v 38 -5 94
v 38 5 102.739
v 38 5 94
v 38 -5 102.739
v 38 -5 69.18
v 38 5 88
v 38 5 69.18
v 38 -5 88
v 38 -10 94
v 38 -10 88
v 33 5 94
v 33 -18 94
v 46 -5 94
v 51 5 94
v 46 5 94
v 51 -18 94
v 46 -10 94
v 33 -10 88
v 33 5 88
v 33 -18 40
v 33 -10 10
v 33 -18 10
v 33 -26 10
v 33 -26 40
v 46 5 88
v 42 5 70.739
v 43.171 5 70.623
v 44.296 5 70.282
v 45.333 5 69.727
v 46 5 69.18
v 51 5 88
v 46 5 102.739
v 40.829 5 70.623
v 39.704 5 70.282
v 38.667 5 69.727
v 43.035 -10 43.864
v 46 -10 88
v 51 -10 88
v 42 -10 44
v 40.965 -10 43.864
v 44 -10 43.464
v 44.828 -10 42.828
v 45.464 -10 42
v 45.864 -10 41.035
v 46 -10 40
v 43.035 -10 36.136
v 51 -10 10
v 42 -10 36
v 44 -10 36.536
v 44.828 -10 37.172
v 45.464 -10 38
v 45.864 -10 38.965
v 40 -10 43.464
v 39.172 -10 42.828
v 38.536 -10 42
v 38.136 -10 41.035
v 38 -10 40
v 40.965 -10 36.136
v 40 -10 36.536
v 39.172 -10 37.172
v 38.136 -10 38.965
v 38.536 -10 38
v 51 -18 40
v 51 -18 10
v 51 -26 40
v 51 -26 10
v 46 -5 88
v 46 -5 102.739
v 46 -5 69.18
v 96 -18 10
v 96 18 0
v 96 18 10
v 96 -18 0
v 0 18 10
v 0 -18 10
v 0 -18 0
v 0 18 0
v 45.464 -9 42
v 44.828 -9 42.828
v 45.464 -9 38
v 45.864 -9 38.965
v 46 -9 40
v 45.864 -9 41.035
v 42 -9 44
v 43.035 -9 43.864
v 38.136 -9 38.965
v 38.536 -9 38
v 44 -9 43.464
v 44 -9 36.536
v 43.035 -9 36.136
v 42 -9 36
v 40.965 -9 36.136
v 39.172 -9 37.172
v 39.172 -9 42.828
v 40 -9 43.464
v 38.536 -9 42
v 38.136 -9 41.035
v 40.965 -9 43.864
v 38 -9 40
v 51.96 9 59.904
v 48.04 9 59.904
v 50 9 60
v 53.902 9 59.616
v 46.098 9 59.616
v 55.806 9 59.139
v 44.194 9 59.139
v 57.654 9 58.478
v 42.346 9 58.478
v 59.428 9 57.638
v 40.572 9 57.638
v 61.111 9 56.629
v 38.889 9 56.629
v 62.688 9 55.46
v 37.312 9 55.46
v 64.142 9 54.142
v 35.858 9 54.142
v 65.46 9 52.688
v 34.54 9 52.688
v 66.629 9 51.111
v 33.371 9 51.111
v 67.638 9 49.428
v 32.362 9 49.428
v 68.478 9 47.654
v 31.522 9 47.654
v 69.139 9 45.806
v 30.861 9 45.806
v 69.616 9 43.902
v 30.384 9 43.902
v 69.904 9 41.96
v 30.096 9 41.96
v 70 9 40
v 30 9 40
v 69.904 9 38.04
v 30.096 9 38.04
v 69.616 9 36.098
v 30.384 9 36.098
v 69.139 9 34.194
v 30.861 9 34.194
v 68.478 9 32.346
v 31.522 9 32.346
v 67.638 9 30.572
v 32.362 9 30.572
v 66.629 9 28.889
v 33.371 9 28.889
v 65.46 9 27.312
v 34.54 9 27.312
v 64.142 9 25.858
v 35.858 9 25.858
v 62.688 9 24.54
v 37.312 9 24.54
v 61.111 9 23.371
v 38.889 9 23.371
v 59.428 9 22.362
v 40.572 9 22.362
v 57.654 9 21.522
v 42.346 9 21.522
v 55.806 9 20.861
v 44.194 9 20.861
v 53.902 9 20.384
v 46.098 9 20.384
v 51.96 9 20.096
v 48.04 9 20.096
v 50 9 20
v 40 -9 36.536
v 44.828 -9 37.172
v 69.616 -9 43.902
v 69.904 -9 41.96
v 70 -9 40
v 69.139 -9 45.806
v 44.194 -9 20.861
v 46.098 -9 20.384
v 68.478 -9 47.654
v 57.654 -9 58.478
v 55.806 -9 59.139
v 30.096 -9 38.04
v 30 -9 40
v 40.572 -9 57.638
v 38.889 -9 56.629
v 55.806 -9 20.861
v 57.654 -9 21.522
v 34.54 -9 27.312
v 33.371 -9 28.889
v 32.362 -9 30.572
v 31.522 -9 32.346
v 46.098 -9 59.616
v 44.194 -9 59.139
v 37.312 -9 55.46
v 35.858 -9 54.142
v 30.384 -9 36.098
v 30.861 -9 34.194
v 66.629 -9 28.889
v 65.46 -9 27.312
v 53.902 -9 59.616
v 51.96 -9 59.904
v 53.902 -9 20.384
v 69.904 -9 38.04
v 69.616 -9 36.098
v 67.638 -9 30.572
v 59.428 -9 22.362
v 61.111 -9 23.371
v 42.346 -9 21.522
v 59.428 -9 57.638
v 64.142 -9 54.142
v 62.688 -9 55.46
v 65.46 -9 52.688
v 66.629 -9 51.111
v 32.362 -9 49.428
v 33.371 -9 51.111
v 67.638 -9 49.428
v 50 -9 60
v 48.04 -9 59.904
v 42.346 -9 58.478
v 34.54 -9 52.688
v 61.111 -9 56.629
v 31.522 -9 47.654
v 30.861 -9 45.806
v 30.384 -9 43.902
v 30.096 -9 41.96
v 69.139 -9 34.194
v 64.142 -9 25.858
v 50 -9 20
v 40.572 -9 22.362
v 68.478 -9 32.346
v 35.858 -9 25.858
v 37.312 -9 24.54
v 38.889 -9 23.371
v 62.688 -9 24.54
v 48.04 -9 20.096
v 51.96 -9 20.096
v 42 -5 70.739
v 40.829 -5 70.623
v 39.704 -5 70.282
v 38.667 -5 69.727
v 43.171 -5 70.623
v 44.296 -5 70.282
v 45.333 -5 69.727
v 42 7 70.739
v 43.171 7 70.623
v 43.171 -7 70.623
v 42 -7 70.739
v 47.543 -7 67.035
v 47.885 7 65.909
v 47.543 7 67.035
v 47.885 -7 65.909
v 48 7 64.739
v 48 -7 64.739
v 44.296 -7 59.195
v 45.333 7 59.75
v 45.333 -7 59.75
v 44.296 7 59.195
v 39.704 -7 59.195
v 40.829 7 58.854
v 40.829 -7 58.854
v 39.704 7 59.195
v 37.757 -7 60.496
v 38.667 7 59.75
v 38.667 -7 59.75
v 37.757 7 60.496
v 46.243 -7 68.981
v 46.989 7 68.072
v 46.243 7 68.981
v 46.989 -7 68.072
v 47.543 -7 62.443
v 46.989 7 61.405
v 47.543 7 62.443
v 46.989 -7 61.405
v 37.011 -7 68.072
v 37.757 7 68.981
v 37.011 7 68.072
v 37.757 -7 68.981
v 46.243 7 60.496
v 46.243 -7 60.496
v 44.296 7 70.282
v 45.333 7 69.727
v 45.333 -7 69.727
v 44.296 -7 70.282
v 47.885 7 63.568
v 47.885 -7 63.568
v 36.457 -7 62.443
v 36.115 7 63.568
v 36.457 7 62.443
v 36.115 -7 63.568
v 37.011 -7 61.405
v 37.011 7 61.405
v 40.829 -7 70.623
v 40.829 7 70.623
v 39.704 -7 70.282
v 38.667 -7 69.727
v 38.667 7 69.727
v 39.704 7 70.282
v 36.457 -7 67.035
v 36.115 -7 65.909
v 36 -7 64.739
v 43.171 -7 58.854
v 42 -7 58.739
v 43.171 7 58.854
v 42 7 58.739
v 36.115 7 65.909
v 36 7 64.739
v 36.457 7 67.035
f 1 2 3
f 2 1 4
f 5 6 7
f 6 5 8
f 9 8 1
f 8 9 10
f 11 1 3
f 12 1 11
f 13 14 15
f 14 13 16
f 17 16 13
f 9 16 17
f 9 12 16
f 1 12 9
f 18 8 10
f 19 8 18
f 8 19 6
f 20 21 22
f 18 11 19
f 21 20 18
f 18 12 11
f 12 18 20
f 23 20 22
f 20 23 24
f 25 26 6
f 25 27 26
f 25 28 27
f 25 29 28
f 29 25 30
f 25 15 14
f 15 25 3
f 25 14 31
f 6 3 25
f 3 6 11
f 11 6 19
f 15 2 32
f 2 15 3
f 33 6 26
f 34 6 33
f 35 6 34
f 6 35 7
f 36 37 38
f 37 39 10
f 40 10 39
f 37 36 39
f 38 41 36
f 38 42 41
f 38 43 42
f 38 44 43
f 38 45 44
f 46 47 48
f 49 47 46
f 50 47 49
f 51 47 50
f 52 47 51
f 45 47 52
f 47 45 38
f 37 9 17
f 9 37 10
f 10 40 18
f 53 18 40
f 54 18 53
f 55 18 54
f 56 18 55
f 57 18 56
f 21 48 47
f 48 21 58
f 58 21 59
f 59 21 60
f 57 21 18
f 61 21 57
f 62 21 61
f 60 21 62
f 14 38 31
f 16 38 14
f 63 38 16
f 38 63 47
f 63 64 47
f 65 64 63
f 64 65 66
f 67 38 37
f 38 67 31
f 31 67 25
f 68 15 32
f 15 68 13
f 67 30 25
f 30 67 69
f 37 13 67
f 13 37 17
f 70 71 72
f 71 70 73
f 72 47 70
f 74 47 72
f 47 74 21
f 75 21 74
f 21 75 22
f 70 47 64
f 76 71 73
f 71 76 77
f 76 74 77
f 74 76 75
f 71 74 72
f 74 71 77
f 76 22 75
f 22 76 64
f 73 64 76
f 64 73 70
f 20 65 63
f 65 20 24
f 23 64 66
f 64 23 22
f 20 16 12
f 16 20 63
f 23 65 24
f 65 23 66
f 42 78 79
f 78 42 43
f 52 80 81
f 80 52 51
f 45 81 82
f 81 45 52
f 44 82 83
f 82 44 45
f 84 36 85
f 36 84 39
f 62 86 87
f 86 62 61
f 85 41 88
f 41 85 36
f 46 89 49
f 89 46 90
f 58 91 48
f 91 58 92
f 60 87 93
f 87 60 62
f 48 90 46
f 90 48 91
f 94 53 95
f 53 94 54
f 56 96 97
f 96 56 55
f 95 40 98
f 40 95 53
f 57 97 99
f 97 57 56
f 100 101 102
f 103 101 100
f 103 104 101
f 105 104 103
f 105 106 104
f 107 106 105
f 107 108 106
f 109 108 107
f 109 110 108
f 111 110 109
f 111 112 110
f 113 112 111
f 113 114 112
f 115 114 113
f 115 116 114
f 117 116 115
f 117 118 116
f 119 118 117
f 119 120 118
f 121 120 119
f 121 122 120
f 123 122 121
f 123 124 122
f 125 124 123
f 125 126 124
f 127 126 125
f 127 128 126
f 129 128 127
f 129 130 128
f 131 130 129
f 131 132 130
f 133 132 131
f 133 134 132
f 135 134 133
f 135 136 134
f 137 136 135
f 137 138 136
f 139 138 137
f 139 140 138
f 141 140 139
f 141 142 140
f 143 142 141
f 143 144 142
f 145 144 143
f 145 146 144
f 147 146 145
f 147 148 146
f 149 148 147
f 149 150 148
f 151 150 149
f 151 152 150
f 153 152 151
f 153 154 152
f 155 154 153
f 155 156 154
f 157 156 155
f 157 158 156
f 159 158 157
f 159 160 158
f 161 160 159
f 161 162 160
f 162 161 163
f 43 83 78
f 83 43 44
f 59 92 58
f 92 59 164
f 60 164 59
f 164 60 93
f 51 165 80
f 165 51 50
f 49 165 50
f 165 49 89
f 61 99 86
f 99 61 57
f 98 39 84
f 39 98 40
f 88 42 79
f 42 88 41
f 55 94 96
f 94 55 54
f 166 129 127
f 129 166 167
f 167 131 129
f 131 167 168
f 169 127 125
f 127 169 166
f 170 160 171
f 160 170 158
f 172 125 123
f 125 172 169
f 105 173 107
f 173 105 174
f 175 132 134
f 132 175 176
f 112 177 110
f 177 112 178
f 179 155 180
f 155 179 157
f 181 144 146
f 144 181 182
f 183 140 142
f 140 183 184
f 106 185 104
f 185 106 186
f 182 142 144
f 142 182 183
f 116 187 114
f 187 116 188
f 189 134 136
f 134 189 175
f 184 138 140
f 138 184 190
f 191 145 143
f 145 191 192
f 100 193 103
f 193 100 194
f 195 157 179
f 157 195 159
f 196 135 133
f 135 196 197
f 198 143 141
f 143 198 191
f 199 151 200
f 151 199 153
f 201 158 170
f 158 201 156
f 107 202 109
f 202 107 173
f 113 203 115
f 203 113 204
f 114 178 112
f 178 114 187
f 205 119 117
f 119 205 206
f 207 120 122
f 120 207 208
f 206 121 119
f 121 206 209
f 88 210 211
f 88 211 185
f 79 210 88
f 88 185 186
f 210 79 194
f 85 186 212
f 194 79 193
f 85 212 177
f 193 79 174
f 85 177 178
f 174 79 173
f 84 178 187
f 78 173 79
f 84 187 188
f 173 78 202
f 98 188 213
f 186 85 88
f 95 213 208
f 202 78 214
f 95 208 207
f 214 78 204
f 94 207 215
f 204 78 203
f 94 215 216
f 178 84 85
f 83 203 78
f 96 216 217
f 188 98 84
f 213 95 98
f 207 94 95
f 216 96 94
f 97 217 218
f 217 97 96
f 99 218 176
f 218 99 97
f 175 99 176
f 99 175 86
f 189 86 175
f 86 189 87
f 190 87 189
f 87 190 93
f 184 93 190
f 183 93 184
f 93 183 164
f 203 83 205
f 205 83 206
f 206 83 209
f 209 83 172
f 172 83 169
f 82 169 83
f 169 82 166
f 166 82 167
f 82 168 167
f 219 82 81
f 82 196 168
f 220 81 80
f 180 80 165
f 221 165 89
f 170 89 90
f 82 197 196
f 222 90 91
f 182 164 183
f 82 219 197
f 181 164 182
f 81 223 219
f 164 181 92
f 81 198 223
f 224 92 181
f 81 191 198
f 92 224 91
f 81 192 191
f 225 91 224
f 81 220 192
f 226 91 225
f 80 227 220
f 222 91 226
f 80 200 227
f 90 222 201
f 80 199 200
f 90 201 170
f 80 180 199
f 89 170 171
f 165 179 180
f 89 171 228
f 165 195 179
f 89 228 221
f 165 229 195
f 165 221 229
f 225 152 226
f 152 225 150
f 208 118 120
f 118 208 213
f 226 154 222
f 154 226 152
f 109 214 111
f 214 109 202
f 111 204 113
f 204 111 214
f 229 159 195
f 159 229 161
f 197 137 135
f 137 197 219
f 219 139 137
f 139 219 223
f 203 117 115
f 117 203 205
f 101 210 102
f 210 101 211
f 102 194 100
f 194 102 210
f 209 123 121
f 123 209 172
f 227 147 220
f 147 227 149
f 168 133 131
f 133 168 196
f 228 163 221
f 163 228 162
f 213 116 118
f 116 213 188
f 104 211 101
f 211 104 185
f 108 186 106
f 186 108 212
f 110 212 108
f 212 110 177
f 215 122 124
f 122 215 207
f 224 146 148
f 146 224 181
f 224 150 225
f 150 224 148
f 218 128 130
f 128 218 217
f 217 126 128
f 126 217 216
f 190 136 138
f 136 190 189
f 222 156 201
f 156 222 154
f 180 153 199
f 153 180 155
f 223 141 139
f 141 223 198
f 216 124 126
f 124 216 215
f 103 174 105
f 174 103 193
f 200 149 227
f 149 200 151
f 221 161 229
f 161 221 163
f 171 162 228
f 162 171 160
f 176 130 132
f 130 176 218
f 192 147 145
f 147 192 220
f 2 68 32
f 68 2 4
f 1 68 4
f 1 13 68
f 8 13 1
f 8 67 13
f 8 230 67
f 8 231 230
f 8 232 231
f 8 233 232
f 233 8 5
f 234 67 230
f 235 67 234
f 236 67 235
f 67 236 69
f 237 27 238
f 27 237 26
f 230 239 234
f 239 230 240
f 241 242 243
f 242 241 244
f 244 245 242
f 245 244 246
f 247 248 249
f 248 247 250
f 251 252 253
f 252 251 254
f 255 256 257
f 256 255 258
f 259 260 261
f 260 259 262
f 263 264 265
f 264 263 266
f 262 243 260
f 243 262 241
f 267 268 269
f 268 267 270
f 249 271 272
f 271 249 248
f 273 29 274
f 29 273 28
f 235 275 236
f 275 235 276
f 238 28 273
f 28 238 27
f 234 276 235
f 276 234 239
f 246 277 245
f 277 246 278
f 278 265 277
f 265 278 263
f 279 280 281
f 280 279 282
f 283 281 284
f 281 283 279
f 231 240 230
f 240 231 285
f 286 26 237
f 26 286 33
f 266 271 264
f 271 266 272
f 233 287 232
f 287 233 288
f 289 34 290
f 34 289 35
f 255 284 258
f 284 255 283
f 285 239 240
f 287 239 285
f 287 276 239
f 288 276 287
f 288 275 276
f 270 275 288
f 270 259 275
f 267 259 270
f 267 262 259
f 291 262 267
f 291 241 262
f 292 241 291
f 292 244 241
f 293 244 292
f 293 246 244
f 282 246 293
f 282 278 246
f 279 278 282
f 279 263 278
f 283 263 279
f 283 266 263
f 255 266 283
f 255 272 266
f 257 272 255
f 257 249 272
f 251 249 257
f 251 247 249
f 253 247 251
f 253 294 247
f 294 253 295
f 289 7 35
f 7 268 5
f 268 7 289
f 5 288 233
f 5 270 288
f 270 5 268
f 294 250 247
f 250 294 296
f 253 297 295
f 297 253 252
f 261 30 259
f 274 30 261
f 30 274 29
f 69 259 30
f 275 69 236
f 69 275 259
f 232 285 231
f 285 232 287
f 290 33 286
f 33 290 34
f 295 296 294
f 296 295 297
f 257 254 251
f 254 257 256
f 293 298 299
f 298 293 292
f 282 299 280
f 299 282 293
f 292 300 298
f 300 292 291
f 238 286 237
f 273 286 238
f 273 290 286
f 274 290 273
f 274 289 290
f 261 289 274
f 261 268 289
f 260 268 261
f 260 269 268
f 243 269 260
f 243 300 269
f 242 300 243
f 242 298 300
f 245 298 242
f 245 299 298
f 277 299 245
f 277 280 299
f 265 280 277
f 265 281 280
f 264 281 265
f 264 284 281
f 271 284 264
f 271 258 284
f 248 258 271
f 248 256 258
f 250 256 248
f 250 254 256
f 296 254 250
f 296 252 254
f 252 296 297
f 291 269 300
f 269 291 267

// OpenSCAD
// A cam and a roller follower.
//
// Nothing here declares how the follower moves. It is a part on a slider, and
// the only thing under it is the cam. The lift you see plotted is not a curve
// anybody wrote — it is what the two shapes leave room for, and it comes out of
// the contact.
//
// The follower's nose is a roller on its own pin, which is what a cam this fast
// would really have. That is not only about wear: a flat face on a curved cam
// is a bad contact to solve as well as to build. The contact point wanders
// across the face, the pair is a flat against a polygon, and a follower pressed
// onto it by a spring works its way in. Curve against curve is one point,
// wherever the cam happens to be.
//
// The cam is a disc turning about a point 8 mm off its own centre — the
// cheapest cam there is, and the only one that stays convex. A profiled cam
// would need `collider = "decompose"`, the way the ratchet wheel does.
//
// Watch the shaft torque. Lifting the follower asks for about 1.2e6; the shaft
// is given 3e7 and needs most of it, because an eccentric cam is an unbalanced
// flywheel and 178 g of steel hung 8 mm off the axis is 1.4e7 all by itself.
// Balance it with a counterweight and the motor could be a tenth of the size.

module part(name, fixed = false, density = undef, mass = undef,
            collider = undef, friction = undef, bounce = undef) { children(); }
module hinge(name, parts, at, axis, range) { }
module slider(name, parts, at, axis, range) { }
module drive(name, to, over, at, torque, speed) { }

STEEL   = 0.0078;
PLASTIC = 0.0012;
PIN     = [0, 1, 0];

R  = 20;                    // cam radius
E  = 8;                     // how far its centre is from the shaft
RR = 6;                     // roller radius
O  = [42, 0, 40];           // the shaft, high enough that the cam clears the deck

// Where the roller's centre sits at the drawn angle: on the line above the
// shaft, one roller and one cam radius away from the cam's own centre.
LIFT = O[2] + sqrt((R + RR) * (R + RR) - E * E);

module barrel(centre, r, h, sides) {
    translate([centre[0], centre[1] + h / 2, centre[2]])
        rotate([90, 0, 0]) cylinder(h = h, r = r, $fn = sides);
}

// The follower's stem is held in a guide: a post standing behind the cam, out
// of the band it sweeps, and two cheeks reaching forward either side of the
// stem. They sit where the stem always is — the roller rides 18 to 34 above the
// shaft, so the stem covers 74 to 96 whatever the cam is doing — and above
// anywhere the roller can reach.
GUIDE = [88, 94];

part("frame", fixed = true)
    color("slategray") {
        translate([0, -18, 0]) cube([96, 36, 10]);
        translate([O[0] - 9, -26, 10]) cube([18, 8, O[2] - 10]);   // shaft pedestal
        // The shaft itself, out of the pedestal and through the cam.
        color("dimgray") translate([O[0], -18, O[2]]) rotate([-90, 0, 0])
            cylinder(h = 27, r = 4, $fn = 24);
        // The guide post, behind the cam, and its two cheeks.
        translate([O[0] - 9, -18, 10]) cube([18, 8, GUIDE[1] - 10]);
        for (x = [O[0] - 9, O[0] + 4])
            translate([x, -10, GUIDE[0]]) cube([5, 15, GUIDE[1] - GUIDE[0]]);
    }

part("cam", density = STEEL, friction = 0.06)
    color("indianred") barrel([O[0] + E, 0, O[2]], R, 18, 64);
hinge("cam_shaft", parts = ["cam", "frame"], at = O, axis = PIN);
drive("cam_shaft", speed = 150, torque = 30000000);

// The follower: a stem on a slider, with a roller pinned to the bottom of it.
part("follower", density = PLASTIC, friction = 0.1, bounce = 0)
    color("olivedrab")
        translate([O[0] - 4, -5, LIFT]) cube([8, 10, 38]);
slider("lift", parts = ["follower", "frame"], at = [O[0], 0, LIFT],
       axis = [0, 0, 1], range = [-16, 16]);

part("roller", density = STEEL, friction = 0.06, bounce = 0)
    color("goldenrod") barrel([O[0], 0, LIFT], RR, 14, 32);
hinge("roller_pin", parts = ["roller", "follower"], at = [O[0], 0, LIFT], axis = PIN);

// The return spring: hold it down, but only this hard. Without one the follower
// rattles over the nose, where the cam drops away from under it.
drive("lift", to = -16, over = 0.4, at = 0, torque = 60000);
